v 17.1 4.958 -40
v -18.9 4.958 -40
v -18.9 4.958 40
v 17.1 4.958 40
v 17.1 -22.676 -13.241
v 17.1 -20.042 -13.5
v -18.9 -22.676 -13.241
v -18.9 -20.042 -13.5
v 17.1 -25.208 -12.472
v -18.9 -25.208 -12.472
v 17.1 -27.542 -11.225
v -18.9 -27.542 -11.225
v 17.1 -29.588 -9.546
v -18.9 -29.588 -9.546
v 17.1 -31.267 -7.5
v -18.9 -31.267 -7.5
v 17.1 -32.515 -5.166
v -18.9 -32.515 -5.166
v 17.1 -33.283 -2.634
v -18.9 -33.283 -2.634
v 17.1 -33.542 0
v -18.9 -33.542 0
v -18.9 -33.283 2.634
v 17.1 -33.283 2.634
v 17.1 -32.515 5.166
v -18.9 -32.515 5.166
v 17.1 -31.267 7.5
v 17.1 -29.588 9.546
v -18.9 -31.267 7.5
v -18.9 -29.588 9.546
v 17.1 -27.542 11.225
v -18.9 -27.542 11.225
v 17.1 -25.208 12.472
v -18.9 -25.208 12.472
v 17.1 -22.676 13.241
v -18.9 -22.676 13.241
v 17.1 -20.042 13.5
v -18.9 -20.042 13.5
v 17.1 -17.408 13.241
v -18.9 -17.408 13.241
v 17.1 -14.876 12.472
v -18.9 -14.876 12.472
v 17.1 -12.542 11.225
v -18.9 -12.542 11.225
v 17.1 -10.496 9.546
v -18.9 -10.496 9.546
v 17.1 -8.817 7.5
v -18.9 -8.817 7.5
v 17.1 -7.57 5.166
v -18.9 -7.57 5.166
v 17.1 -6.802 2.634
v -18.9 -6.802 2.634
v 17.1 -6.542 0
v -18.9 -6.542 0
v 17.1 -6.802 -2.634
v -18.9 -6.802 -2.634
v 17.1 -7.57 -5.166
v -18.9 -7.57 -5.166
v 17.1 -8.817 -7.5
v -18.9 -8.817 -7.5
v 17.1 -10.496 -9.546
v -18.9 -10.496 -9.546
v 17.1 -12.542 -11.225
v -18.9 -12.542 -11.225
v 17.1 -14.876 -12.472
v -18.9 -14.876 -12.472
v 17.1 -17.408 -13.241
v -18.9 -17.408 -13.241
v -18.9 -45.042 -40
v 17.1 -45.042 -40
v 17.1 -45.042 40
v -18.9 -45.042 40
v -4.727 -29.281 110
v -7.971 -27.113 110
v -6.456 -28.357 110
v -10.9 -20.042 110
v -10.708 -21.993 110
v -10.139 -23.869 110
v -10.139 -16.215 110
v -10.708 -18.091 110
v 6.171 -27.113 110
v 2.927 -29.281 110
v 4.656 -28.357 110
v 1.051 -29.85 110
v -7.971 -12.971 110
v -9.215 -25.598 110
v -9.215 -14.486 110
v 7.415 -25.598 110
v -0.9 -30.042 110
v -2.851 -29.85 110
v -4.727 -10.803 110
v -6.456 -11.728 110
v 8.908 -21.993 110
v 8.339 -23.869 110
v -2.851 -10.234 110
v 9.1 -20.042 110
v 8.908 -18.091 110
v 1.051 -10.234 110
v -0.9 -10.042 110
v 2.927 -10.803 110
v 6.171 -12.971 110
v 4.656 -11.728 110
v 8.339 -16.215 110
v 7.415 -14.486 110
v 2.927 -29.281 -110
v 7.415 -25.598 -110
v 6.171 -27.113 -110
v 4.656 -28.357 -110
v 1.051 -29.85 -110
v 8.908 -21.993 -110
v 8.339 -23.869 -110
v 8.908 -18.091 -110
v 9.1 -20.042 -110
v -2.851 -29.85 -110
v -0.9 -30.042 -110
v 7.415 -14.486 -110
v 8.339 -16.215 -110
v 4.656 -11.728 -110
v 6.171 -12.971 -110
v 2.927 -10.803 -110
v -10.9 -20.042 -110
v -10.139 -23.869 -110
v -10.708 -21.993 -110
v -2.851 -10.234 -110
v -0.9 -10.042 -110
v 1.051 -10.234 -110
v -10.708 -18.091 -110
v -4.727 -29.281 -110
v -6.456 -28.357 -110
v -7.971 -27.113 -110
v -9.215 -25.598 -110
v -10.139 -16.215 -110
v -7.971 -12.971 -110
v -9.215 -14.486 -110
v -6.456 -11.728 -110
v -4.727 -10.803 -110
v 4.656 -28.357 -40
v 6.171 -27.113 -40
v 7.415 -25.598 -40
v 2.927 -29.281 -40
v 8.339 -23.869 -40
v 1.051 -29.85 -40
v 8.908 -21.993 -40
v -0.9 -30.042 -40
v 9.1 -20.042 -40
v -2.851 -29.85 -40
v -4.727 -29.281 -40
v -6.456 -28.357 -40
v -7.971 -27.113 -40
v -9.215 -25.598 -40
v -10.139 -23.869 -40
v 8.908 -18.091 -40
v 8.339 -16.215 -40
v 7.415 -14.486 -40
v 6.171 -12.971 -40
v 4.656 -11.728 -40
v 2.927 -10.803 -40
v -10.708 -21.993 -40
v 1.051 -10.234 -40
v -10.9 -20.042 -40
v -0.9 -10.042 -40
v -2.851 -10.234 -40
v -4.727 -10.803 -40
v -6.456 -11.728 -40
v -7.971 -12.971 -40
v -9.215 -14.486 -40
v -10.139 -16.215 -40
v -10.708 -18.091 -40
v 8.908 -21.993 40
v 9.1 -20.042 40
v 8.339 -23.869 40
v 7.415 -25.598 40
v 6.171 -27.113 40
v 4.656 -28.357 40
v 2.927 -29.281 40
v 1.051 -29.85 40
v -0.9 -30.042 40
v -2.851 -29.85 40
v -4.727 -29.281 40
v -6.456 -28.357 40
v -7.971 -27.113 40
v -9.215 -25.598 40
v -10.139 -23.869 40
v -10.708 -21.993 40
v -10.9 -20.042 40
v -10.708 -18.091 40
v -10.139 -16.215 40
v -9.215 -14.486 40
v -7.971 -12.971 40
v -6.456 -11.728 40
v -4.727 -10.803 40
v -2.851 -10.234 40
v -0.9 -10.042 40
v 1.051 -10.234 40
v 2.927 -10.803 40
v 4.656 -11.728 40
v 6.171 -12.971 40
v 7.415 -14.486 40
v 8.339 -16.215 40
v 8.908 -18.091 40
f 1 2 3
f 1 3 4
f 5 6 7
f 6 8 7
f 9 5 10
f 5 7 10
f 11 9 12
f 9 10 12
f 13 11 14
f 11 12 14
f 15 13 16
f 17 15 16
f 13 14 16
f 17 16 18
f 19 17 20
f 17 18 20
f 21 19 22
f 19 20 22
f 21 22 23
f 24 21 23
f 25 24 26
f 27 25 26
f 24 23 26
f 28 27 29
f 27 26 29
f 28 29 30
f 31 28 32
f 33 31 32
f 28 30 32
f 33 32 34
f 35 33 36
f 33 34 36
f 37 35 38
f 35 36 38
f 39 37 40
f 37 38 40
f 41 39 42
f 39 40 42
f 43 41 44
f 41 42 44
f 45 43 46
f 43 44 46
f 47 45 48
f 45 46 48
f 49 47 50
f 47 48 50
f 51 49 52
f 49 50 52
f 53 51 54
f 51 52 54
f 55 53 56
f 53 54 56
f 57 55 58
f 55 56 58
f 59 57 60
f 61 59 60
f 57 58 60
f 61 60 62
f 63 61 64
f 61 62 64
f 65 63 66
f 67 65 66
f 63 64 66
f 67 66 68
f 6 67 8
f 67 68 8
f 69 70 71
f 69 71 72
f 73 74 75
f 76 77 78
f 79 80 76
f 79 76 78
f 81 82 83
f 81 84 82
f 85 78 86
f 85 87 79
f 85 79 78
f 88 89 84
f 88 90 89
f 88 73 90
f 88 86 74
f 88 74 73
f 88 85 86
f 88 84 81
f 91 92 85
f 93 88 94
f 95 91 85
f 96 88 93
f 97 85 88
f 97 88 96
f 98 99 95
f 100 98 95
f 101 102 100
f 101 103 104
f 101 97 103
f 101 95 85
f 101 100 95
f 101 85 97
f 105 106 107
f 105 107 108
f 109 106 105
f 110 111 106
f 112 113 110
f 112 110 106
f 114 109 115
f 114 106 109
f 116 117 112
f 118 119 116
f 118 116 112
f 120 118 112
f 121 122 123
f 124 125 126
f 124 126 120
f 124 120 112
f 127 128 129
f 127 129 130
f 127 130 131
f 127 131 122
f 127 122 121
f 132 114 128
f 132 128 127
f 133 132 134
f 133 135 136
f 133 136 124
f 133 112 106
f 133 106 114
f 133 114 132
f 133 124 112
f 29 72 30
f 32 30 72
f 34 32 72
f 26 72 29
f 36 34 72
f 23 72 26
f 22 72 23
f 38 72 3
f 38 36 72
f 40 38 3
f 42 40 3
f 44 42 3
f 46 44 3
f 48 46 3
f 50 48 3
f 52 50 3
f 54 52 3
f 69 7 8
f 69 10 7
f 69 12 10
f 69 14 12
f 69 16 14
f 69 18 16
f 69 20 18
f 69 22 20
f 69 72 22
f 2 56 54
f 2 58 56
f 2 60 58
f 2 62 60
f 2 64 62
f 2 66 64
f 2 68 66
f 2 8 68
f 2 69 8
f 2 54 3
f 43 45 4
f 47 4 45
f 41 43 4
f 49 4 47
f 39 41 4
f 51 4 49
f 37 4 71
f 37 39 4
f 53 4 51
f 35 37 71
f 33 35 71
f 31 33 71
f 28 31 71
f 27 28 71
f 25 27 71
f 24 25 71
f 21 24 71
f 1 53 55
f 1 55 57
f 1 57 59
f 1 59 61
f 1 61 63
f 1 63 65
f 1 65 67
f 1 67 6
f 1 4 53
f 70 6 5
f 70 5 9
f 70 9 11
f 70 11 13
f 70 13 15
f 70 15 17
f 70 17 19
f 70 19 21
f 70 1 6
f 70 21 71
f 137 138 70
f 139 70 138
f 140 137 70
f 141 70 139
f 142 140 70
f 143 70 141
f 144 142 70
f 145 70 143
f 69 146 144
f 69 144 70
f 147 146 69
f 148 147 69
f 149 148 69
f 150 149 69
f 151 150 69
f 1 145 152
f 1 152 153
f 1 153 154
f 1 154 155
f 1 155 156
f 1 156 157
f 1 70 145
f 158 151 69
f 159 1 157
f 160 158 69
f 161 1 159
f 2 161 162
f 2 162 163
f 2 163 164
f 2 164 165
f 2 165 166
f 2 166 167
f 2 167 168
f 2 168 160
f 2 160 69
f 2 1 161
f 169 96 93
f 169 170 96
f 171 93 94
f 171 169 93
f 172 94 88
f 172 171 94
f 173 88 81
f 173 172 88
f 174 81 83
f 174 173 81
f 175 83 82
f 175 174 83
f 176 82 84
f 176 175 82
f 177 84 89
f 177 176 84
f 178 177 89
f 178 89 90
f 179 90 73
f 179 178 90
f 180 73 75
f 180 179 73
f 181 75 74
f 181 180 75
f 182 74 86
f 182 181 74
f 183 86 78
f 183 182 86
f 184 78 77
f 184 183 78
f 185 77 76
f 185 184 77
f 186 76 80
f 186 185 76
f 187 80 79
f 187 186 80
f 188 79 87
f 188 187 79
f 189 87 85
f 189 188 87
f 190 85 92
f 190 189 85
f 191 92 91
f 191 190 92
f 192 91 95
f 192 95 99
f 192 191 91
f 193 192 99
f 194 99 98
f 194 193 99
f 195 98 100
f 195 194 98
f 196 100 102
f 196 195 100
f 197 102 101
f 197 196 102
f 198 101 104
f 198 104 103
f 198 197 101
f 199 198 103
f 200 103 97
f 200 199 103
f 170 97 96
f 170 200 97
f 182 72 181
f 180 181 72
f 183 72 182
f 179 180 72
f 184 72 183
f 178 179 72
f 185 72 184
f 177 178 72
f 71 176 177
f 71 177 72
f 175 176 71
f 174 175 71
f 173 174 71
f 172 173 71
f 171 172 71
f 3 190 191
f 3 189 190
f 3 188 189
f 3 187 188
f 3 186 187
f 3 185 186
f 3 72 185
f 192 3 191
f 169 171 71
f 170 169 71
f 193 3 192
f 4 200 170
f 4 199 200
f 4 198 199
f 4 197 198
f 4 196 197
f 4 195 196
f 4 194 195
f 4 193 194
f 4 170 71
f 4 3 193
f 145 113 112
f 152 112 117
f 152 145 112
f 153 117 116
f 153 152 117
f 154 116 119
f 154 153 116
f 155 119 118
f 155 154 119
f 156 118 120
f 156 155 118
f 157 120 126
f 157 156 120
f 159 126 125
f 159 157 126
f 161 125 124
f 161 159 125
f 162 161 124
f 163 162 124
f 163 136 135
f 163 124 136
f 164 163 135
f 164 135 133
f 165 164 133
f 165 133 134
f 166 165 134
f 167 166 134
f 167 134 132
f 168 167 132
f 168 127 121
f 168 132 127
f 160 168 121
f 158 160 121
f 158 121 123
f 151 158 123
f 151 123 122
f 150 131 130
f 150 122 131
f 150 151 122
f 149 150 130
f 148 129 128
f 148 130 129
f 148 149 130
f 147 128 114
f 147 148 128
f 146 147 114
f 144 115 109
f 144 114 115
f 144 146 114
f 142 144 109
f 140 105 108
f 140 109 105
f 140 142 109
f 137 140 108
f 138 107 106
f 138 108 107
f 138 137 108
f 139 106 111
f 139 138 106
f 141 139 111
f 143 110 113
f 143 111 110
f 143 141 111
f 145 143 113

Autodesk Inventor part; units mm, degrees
ref_plane "YZ Plane" through (0, 0, 0) normal (1, 0, 0) x (0, 1, 0)
ref_plane "XZ Plane" through (0, 0, 0) normal (0, 1, 0) x (-1, 0, 0)
ref_plane "XY Plane" through (0, 0, 0) normal (0, 0, 1) x (1, 0, 0)
sketch "Szkic1" plane through (0, 0, 0) normal (0, 0, 1) x (1, 0, 0)
  line L0 (-18.8999, 4.9578) -> (17.1001, 4.9578)
  line L1 (17.1001, 4.9578) -> (17.1001, -45.0422)
  line L2 (17.1001, -45.0422) -> (-18.8999, -45.0422)
  line L3 (-18.8999, -45.0422) -> (-18.8999, 4.9578)
  point P0 (0, 0)
  dimension "d0" = 36
  dimension "d1" = 50
extrude "Wyciągnięcie proste1" add sketch "Szkic1" along normal blind 40
sketch "Szkic2" plane through (0, 0, 40) normal (0, 0, 1) x (1, 0, 0)
  line L0 (-18.8999, 4.9578) -> (-18.8999, -45.0422) projected
  line L1 (-18.8999, -45.0422) -> (17.1001, -45.0422) projected
  line L2 (-18.8999, 4.9578) -> (17.1001, -45.0422)
  line L3 (17.1001, -45.0422) -> (17.1001, 4.9578) projected
  line L4 (17.1001, 4.9578) -> (-18.8999, -45.0422)
  circle A0 centre (-0.8999, -20.0422) radius 10
  point P0 (0, 0)
  dimension "d4" = 20
extrude "Wyciągnięcie proste2" add sketch "Szkic2" along normal blind 70 contours A0 L4 L2 | L2 L4 A0 | L4 L2 A0 | L4 A0 L2
mirror "Odbij1" about plane through (-0.8999, -20.0422, 0) normal (0, 0, -1)
sketch "Szkic3" plane through (17.1001, -45.0422, 40) normal (1, 0, 0) x (0, 0, -1)
  line L0 (0, 0) -> (0, 50) projected
  line L1 (80, 0) -> (0, 0) projected
  line L2 (0, 50) -> (80, 0)
  line L3 (80, 0) -> (80, 50) projected
  line L4 (80, 50) -> (0, 0)
  point P0 (40, 45.0422)
  point P1 (40, 25)
hole "Otwór1" at (17.1001, -20.0422, 0) direction (-1, 0, 0) diameter 27 end through all thread size "TR30x3" class "7H" standard "ISO Metric Trapezoidal Threads"
properties part number "sworzeń z nakrętką"
